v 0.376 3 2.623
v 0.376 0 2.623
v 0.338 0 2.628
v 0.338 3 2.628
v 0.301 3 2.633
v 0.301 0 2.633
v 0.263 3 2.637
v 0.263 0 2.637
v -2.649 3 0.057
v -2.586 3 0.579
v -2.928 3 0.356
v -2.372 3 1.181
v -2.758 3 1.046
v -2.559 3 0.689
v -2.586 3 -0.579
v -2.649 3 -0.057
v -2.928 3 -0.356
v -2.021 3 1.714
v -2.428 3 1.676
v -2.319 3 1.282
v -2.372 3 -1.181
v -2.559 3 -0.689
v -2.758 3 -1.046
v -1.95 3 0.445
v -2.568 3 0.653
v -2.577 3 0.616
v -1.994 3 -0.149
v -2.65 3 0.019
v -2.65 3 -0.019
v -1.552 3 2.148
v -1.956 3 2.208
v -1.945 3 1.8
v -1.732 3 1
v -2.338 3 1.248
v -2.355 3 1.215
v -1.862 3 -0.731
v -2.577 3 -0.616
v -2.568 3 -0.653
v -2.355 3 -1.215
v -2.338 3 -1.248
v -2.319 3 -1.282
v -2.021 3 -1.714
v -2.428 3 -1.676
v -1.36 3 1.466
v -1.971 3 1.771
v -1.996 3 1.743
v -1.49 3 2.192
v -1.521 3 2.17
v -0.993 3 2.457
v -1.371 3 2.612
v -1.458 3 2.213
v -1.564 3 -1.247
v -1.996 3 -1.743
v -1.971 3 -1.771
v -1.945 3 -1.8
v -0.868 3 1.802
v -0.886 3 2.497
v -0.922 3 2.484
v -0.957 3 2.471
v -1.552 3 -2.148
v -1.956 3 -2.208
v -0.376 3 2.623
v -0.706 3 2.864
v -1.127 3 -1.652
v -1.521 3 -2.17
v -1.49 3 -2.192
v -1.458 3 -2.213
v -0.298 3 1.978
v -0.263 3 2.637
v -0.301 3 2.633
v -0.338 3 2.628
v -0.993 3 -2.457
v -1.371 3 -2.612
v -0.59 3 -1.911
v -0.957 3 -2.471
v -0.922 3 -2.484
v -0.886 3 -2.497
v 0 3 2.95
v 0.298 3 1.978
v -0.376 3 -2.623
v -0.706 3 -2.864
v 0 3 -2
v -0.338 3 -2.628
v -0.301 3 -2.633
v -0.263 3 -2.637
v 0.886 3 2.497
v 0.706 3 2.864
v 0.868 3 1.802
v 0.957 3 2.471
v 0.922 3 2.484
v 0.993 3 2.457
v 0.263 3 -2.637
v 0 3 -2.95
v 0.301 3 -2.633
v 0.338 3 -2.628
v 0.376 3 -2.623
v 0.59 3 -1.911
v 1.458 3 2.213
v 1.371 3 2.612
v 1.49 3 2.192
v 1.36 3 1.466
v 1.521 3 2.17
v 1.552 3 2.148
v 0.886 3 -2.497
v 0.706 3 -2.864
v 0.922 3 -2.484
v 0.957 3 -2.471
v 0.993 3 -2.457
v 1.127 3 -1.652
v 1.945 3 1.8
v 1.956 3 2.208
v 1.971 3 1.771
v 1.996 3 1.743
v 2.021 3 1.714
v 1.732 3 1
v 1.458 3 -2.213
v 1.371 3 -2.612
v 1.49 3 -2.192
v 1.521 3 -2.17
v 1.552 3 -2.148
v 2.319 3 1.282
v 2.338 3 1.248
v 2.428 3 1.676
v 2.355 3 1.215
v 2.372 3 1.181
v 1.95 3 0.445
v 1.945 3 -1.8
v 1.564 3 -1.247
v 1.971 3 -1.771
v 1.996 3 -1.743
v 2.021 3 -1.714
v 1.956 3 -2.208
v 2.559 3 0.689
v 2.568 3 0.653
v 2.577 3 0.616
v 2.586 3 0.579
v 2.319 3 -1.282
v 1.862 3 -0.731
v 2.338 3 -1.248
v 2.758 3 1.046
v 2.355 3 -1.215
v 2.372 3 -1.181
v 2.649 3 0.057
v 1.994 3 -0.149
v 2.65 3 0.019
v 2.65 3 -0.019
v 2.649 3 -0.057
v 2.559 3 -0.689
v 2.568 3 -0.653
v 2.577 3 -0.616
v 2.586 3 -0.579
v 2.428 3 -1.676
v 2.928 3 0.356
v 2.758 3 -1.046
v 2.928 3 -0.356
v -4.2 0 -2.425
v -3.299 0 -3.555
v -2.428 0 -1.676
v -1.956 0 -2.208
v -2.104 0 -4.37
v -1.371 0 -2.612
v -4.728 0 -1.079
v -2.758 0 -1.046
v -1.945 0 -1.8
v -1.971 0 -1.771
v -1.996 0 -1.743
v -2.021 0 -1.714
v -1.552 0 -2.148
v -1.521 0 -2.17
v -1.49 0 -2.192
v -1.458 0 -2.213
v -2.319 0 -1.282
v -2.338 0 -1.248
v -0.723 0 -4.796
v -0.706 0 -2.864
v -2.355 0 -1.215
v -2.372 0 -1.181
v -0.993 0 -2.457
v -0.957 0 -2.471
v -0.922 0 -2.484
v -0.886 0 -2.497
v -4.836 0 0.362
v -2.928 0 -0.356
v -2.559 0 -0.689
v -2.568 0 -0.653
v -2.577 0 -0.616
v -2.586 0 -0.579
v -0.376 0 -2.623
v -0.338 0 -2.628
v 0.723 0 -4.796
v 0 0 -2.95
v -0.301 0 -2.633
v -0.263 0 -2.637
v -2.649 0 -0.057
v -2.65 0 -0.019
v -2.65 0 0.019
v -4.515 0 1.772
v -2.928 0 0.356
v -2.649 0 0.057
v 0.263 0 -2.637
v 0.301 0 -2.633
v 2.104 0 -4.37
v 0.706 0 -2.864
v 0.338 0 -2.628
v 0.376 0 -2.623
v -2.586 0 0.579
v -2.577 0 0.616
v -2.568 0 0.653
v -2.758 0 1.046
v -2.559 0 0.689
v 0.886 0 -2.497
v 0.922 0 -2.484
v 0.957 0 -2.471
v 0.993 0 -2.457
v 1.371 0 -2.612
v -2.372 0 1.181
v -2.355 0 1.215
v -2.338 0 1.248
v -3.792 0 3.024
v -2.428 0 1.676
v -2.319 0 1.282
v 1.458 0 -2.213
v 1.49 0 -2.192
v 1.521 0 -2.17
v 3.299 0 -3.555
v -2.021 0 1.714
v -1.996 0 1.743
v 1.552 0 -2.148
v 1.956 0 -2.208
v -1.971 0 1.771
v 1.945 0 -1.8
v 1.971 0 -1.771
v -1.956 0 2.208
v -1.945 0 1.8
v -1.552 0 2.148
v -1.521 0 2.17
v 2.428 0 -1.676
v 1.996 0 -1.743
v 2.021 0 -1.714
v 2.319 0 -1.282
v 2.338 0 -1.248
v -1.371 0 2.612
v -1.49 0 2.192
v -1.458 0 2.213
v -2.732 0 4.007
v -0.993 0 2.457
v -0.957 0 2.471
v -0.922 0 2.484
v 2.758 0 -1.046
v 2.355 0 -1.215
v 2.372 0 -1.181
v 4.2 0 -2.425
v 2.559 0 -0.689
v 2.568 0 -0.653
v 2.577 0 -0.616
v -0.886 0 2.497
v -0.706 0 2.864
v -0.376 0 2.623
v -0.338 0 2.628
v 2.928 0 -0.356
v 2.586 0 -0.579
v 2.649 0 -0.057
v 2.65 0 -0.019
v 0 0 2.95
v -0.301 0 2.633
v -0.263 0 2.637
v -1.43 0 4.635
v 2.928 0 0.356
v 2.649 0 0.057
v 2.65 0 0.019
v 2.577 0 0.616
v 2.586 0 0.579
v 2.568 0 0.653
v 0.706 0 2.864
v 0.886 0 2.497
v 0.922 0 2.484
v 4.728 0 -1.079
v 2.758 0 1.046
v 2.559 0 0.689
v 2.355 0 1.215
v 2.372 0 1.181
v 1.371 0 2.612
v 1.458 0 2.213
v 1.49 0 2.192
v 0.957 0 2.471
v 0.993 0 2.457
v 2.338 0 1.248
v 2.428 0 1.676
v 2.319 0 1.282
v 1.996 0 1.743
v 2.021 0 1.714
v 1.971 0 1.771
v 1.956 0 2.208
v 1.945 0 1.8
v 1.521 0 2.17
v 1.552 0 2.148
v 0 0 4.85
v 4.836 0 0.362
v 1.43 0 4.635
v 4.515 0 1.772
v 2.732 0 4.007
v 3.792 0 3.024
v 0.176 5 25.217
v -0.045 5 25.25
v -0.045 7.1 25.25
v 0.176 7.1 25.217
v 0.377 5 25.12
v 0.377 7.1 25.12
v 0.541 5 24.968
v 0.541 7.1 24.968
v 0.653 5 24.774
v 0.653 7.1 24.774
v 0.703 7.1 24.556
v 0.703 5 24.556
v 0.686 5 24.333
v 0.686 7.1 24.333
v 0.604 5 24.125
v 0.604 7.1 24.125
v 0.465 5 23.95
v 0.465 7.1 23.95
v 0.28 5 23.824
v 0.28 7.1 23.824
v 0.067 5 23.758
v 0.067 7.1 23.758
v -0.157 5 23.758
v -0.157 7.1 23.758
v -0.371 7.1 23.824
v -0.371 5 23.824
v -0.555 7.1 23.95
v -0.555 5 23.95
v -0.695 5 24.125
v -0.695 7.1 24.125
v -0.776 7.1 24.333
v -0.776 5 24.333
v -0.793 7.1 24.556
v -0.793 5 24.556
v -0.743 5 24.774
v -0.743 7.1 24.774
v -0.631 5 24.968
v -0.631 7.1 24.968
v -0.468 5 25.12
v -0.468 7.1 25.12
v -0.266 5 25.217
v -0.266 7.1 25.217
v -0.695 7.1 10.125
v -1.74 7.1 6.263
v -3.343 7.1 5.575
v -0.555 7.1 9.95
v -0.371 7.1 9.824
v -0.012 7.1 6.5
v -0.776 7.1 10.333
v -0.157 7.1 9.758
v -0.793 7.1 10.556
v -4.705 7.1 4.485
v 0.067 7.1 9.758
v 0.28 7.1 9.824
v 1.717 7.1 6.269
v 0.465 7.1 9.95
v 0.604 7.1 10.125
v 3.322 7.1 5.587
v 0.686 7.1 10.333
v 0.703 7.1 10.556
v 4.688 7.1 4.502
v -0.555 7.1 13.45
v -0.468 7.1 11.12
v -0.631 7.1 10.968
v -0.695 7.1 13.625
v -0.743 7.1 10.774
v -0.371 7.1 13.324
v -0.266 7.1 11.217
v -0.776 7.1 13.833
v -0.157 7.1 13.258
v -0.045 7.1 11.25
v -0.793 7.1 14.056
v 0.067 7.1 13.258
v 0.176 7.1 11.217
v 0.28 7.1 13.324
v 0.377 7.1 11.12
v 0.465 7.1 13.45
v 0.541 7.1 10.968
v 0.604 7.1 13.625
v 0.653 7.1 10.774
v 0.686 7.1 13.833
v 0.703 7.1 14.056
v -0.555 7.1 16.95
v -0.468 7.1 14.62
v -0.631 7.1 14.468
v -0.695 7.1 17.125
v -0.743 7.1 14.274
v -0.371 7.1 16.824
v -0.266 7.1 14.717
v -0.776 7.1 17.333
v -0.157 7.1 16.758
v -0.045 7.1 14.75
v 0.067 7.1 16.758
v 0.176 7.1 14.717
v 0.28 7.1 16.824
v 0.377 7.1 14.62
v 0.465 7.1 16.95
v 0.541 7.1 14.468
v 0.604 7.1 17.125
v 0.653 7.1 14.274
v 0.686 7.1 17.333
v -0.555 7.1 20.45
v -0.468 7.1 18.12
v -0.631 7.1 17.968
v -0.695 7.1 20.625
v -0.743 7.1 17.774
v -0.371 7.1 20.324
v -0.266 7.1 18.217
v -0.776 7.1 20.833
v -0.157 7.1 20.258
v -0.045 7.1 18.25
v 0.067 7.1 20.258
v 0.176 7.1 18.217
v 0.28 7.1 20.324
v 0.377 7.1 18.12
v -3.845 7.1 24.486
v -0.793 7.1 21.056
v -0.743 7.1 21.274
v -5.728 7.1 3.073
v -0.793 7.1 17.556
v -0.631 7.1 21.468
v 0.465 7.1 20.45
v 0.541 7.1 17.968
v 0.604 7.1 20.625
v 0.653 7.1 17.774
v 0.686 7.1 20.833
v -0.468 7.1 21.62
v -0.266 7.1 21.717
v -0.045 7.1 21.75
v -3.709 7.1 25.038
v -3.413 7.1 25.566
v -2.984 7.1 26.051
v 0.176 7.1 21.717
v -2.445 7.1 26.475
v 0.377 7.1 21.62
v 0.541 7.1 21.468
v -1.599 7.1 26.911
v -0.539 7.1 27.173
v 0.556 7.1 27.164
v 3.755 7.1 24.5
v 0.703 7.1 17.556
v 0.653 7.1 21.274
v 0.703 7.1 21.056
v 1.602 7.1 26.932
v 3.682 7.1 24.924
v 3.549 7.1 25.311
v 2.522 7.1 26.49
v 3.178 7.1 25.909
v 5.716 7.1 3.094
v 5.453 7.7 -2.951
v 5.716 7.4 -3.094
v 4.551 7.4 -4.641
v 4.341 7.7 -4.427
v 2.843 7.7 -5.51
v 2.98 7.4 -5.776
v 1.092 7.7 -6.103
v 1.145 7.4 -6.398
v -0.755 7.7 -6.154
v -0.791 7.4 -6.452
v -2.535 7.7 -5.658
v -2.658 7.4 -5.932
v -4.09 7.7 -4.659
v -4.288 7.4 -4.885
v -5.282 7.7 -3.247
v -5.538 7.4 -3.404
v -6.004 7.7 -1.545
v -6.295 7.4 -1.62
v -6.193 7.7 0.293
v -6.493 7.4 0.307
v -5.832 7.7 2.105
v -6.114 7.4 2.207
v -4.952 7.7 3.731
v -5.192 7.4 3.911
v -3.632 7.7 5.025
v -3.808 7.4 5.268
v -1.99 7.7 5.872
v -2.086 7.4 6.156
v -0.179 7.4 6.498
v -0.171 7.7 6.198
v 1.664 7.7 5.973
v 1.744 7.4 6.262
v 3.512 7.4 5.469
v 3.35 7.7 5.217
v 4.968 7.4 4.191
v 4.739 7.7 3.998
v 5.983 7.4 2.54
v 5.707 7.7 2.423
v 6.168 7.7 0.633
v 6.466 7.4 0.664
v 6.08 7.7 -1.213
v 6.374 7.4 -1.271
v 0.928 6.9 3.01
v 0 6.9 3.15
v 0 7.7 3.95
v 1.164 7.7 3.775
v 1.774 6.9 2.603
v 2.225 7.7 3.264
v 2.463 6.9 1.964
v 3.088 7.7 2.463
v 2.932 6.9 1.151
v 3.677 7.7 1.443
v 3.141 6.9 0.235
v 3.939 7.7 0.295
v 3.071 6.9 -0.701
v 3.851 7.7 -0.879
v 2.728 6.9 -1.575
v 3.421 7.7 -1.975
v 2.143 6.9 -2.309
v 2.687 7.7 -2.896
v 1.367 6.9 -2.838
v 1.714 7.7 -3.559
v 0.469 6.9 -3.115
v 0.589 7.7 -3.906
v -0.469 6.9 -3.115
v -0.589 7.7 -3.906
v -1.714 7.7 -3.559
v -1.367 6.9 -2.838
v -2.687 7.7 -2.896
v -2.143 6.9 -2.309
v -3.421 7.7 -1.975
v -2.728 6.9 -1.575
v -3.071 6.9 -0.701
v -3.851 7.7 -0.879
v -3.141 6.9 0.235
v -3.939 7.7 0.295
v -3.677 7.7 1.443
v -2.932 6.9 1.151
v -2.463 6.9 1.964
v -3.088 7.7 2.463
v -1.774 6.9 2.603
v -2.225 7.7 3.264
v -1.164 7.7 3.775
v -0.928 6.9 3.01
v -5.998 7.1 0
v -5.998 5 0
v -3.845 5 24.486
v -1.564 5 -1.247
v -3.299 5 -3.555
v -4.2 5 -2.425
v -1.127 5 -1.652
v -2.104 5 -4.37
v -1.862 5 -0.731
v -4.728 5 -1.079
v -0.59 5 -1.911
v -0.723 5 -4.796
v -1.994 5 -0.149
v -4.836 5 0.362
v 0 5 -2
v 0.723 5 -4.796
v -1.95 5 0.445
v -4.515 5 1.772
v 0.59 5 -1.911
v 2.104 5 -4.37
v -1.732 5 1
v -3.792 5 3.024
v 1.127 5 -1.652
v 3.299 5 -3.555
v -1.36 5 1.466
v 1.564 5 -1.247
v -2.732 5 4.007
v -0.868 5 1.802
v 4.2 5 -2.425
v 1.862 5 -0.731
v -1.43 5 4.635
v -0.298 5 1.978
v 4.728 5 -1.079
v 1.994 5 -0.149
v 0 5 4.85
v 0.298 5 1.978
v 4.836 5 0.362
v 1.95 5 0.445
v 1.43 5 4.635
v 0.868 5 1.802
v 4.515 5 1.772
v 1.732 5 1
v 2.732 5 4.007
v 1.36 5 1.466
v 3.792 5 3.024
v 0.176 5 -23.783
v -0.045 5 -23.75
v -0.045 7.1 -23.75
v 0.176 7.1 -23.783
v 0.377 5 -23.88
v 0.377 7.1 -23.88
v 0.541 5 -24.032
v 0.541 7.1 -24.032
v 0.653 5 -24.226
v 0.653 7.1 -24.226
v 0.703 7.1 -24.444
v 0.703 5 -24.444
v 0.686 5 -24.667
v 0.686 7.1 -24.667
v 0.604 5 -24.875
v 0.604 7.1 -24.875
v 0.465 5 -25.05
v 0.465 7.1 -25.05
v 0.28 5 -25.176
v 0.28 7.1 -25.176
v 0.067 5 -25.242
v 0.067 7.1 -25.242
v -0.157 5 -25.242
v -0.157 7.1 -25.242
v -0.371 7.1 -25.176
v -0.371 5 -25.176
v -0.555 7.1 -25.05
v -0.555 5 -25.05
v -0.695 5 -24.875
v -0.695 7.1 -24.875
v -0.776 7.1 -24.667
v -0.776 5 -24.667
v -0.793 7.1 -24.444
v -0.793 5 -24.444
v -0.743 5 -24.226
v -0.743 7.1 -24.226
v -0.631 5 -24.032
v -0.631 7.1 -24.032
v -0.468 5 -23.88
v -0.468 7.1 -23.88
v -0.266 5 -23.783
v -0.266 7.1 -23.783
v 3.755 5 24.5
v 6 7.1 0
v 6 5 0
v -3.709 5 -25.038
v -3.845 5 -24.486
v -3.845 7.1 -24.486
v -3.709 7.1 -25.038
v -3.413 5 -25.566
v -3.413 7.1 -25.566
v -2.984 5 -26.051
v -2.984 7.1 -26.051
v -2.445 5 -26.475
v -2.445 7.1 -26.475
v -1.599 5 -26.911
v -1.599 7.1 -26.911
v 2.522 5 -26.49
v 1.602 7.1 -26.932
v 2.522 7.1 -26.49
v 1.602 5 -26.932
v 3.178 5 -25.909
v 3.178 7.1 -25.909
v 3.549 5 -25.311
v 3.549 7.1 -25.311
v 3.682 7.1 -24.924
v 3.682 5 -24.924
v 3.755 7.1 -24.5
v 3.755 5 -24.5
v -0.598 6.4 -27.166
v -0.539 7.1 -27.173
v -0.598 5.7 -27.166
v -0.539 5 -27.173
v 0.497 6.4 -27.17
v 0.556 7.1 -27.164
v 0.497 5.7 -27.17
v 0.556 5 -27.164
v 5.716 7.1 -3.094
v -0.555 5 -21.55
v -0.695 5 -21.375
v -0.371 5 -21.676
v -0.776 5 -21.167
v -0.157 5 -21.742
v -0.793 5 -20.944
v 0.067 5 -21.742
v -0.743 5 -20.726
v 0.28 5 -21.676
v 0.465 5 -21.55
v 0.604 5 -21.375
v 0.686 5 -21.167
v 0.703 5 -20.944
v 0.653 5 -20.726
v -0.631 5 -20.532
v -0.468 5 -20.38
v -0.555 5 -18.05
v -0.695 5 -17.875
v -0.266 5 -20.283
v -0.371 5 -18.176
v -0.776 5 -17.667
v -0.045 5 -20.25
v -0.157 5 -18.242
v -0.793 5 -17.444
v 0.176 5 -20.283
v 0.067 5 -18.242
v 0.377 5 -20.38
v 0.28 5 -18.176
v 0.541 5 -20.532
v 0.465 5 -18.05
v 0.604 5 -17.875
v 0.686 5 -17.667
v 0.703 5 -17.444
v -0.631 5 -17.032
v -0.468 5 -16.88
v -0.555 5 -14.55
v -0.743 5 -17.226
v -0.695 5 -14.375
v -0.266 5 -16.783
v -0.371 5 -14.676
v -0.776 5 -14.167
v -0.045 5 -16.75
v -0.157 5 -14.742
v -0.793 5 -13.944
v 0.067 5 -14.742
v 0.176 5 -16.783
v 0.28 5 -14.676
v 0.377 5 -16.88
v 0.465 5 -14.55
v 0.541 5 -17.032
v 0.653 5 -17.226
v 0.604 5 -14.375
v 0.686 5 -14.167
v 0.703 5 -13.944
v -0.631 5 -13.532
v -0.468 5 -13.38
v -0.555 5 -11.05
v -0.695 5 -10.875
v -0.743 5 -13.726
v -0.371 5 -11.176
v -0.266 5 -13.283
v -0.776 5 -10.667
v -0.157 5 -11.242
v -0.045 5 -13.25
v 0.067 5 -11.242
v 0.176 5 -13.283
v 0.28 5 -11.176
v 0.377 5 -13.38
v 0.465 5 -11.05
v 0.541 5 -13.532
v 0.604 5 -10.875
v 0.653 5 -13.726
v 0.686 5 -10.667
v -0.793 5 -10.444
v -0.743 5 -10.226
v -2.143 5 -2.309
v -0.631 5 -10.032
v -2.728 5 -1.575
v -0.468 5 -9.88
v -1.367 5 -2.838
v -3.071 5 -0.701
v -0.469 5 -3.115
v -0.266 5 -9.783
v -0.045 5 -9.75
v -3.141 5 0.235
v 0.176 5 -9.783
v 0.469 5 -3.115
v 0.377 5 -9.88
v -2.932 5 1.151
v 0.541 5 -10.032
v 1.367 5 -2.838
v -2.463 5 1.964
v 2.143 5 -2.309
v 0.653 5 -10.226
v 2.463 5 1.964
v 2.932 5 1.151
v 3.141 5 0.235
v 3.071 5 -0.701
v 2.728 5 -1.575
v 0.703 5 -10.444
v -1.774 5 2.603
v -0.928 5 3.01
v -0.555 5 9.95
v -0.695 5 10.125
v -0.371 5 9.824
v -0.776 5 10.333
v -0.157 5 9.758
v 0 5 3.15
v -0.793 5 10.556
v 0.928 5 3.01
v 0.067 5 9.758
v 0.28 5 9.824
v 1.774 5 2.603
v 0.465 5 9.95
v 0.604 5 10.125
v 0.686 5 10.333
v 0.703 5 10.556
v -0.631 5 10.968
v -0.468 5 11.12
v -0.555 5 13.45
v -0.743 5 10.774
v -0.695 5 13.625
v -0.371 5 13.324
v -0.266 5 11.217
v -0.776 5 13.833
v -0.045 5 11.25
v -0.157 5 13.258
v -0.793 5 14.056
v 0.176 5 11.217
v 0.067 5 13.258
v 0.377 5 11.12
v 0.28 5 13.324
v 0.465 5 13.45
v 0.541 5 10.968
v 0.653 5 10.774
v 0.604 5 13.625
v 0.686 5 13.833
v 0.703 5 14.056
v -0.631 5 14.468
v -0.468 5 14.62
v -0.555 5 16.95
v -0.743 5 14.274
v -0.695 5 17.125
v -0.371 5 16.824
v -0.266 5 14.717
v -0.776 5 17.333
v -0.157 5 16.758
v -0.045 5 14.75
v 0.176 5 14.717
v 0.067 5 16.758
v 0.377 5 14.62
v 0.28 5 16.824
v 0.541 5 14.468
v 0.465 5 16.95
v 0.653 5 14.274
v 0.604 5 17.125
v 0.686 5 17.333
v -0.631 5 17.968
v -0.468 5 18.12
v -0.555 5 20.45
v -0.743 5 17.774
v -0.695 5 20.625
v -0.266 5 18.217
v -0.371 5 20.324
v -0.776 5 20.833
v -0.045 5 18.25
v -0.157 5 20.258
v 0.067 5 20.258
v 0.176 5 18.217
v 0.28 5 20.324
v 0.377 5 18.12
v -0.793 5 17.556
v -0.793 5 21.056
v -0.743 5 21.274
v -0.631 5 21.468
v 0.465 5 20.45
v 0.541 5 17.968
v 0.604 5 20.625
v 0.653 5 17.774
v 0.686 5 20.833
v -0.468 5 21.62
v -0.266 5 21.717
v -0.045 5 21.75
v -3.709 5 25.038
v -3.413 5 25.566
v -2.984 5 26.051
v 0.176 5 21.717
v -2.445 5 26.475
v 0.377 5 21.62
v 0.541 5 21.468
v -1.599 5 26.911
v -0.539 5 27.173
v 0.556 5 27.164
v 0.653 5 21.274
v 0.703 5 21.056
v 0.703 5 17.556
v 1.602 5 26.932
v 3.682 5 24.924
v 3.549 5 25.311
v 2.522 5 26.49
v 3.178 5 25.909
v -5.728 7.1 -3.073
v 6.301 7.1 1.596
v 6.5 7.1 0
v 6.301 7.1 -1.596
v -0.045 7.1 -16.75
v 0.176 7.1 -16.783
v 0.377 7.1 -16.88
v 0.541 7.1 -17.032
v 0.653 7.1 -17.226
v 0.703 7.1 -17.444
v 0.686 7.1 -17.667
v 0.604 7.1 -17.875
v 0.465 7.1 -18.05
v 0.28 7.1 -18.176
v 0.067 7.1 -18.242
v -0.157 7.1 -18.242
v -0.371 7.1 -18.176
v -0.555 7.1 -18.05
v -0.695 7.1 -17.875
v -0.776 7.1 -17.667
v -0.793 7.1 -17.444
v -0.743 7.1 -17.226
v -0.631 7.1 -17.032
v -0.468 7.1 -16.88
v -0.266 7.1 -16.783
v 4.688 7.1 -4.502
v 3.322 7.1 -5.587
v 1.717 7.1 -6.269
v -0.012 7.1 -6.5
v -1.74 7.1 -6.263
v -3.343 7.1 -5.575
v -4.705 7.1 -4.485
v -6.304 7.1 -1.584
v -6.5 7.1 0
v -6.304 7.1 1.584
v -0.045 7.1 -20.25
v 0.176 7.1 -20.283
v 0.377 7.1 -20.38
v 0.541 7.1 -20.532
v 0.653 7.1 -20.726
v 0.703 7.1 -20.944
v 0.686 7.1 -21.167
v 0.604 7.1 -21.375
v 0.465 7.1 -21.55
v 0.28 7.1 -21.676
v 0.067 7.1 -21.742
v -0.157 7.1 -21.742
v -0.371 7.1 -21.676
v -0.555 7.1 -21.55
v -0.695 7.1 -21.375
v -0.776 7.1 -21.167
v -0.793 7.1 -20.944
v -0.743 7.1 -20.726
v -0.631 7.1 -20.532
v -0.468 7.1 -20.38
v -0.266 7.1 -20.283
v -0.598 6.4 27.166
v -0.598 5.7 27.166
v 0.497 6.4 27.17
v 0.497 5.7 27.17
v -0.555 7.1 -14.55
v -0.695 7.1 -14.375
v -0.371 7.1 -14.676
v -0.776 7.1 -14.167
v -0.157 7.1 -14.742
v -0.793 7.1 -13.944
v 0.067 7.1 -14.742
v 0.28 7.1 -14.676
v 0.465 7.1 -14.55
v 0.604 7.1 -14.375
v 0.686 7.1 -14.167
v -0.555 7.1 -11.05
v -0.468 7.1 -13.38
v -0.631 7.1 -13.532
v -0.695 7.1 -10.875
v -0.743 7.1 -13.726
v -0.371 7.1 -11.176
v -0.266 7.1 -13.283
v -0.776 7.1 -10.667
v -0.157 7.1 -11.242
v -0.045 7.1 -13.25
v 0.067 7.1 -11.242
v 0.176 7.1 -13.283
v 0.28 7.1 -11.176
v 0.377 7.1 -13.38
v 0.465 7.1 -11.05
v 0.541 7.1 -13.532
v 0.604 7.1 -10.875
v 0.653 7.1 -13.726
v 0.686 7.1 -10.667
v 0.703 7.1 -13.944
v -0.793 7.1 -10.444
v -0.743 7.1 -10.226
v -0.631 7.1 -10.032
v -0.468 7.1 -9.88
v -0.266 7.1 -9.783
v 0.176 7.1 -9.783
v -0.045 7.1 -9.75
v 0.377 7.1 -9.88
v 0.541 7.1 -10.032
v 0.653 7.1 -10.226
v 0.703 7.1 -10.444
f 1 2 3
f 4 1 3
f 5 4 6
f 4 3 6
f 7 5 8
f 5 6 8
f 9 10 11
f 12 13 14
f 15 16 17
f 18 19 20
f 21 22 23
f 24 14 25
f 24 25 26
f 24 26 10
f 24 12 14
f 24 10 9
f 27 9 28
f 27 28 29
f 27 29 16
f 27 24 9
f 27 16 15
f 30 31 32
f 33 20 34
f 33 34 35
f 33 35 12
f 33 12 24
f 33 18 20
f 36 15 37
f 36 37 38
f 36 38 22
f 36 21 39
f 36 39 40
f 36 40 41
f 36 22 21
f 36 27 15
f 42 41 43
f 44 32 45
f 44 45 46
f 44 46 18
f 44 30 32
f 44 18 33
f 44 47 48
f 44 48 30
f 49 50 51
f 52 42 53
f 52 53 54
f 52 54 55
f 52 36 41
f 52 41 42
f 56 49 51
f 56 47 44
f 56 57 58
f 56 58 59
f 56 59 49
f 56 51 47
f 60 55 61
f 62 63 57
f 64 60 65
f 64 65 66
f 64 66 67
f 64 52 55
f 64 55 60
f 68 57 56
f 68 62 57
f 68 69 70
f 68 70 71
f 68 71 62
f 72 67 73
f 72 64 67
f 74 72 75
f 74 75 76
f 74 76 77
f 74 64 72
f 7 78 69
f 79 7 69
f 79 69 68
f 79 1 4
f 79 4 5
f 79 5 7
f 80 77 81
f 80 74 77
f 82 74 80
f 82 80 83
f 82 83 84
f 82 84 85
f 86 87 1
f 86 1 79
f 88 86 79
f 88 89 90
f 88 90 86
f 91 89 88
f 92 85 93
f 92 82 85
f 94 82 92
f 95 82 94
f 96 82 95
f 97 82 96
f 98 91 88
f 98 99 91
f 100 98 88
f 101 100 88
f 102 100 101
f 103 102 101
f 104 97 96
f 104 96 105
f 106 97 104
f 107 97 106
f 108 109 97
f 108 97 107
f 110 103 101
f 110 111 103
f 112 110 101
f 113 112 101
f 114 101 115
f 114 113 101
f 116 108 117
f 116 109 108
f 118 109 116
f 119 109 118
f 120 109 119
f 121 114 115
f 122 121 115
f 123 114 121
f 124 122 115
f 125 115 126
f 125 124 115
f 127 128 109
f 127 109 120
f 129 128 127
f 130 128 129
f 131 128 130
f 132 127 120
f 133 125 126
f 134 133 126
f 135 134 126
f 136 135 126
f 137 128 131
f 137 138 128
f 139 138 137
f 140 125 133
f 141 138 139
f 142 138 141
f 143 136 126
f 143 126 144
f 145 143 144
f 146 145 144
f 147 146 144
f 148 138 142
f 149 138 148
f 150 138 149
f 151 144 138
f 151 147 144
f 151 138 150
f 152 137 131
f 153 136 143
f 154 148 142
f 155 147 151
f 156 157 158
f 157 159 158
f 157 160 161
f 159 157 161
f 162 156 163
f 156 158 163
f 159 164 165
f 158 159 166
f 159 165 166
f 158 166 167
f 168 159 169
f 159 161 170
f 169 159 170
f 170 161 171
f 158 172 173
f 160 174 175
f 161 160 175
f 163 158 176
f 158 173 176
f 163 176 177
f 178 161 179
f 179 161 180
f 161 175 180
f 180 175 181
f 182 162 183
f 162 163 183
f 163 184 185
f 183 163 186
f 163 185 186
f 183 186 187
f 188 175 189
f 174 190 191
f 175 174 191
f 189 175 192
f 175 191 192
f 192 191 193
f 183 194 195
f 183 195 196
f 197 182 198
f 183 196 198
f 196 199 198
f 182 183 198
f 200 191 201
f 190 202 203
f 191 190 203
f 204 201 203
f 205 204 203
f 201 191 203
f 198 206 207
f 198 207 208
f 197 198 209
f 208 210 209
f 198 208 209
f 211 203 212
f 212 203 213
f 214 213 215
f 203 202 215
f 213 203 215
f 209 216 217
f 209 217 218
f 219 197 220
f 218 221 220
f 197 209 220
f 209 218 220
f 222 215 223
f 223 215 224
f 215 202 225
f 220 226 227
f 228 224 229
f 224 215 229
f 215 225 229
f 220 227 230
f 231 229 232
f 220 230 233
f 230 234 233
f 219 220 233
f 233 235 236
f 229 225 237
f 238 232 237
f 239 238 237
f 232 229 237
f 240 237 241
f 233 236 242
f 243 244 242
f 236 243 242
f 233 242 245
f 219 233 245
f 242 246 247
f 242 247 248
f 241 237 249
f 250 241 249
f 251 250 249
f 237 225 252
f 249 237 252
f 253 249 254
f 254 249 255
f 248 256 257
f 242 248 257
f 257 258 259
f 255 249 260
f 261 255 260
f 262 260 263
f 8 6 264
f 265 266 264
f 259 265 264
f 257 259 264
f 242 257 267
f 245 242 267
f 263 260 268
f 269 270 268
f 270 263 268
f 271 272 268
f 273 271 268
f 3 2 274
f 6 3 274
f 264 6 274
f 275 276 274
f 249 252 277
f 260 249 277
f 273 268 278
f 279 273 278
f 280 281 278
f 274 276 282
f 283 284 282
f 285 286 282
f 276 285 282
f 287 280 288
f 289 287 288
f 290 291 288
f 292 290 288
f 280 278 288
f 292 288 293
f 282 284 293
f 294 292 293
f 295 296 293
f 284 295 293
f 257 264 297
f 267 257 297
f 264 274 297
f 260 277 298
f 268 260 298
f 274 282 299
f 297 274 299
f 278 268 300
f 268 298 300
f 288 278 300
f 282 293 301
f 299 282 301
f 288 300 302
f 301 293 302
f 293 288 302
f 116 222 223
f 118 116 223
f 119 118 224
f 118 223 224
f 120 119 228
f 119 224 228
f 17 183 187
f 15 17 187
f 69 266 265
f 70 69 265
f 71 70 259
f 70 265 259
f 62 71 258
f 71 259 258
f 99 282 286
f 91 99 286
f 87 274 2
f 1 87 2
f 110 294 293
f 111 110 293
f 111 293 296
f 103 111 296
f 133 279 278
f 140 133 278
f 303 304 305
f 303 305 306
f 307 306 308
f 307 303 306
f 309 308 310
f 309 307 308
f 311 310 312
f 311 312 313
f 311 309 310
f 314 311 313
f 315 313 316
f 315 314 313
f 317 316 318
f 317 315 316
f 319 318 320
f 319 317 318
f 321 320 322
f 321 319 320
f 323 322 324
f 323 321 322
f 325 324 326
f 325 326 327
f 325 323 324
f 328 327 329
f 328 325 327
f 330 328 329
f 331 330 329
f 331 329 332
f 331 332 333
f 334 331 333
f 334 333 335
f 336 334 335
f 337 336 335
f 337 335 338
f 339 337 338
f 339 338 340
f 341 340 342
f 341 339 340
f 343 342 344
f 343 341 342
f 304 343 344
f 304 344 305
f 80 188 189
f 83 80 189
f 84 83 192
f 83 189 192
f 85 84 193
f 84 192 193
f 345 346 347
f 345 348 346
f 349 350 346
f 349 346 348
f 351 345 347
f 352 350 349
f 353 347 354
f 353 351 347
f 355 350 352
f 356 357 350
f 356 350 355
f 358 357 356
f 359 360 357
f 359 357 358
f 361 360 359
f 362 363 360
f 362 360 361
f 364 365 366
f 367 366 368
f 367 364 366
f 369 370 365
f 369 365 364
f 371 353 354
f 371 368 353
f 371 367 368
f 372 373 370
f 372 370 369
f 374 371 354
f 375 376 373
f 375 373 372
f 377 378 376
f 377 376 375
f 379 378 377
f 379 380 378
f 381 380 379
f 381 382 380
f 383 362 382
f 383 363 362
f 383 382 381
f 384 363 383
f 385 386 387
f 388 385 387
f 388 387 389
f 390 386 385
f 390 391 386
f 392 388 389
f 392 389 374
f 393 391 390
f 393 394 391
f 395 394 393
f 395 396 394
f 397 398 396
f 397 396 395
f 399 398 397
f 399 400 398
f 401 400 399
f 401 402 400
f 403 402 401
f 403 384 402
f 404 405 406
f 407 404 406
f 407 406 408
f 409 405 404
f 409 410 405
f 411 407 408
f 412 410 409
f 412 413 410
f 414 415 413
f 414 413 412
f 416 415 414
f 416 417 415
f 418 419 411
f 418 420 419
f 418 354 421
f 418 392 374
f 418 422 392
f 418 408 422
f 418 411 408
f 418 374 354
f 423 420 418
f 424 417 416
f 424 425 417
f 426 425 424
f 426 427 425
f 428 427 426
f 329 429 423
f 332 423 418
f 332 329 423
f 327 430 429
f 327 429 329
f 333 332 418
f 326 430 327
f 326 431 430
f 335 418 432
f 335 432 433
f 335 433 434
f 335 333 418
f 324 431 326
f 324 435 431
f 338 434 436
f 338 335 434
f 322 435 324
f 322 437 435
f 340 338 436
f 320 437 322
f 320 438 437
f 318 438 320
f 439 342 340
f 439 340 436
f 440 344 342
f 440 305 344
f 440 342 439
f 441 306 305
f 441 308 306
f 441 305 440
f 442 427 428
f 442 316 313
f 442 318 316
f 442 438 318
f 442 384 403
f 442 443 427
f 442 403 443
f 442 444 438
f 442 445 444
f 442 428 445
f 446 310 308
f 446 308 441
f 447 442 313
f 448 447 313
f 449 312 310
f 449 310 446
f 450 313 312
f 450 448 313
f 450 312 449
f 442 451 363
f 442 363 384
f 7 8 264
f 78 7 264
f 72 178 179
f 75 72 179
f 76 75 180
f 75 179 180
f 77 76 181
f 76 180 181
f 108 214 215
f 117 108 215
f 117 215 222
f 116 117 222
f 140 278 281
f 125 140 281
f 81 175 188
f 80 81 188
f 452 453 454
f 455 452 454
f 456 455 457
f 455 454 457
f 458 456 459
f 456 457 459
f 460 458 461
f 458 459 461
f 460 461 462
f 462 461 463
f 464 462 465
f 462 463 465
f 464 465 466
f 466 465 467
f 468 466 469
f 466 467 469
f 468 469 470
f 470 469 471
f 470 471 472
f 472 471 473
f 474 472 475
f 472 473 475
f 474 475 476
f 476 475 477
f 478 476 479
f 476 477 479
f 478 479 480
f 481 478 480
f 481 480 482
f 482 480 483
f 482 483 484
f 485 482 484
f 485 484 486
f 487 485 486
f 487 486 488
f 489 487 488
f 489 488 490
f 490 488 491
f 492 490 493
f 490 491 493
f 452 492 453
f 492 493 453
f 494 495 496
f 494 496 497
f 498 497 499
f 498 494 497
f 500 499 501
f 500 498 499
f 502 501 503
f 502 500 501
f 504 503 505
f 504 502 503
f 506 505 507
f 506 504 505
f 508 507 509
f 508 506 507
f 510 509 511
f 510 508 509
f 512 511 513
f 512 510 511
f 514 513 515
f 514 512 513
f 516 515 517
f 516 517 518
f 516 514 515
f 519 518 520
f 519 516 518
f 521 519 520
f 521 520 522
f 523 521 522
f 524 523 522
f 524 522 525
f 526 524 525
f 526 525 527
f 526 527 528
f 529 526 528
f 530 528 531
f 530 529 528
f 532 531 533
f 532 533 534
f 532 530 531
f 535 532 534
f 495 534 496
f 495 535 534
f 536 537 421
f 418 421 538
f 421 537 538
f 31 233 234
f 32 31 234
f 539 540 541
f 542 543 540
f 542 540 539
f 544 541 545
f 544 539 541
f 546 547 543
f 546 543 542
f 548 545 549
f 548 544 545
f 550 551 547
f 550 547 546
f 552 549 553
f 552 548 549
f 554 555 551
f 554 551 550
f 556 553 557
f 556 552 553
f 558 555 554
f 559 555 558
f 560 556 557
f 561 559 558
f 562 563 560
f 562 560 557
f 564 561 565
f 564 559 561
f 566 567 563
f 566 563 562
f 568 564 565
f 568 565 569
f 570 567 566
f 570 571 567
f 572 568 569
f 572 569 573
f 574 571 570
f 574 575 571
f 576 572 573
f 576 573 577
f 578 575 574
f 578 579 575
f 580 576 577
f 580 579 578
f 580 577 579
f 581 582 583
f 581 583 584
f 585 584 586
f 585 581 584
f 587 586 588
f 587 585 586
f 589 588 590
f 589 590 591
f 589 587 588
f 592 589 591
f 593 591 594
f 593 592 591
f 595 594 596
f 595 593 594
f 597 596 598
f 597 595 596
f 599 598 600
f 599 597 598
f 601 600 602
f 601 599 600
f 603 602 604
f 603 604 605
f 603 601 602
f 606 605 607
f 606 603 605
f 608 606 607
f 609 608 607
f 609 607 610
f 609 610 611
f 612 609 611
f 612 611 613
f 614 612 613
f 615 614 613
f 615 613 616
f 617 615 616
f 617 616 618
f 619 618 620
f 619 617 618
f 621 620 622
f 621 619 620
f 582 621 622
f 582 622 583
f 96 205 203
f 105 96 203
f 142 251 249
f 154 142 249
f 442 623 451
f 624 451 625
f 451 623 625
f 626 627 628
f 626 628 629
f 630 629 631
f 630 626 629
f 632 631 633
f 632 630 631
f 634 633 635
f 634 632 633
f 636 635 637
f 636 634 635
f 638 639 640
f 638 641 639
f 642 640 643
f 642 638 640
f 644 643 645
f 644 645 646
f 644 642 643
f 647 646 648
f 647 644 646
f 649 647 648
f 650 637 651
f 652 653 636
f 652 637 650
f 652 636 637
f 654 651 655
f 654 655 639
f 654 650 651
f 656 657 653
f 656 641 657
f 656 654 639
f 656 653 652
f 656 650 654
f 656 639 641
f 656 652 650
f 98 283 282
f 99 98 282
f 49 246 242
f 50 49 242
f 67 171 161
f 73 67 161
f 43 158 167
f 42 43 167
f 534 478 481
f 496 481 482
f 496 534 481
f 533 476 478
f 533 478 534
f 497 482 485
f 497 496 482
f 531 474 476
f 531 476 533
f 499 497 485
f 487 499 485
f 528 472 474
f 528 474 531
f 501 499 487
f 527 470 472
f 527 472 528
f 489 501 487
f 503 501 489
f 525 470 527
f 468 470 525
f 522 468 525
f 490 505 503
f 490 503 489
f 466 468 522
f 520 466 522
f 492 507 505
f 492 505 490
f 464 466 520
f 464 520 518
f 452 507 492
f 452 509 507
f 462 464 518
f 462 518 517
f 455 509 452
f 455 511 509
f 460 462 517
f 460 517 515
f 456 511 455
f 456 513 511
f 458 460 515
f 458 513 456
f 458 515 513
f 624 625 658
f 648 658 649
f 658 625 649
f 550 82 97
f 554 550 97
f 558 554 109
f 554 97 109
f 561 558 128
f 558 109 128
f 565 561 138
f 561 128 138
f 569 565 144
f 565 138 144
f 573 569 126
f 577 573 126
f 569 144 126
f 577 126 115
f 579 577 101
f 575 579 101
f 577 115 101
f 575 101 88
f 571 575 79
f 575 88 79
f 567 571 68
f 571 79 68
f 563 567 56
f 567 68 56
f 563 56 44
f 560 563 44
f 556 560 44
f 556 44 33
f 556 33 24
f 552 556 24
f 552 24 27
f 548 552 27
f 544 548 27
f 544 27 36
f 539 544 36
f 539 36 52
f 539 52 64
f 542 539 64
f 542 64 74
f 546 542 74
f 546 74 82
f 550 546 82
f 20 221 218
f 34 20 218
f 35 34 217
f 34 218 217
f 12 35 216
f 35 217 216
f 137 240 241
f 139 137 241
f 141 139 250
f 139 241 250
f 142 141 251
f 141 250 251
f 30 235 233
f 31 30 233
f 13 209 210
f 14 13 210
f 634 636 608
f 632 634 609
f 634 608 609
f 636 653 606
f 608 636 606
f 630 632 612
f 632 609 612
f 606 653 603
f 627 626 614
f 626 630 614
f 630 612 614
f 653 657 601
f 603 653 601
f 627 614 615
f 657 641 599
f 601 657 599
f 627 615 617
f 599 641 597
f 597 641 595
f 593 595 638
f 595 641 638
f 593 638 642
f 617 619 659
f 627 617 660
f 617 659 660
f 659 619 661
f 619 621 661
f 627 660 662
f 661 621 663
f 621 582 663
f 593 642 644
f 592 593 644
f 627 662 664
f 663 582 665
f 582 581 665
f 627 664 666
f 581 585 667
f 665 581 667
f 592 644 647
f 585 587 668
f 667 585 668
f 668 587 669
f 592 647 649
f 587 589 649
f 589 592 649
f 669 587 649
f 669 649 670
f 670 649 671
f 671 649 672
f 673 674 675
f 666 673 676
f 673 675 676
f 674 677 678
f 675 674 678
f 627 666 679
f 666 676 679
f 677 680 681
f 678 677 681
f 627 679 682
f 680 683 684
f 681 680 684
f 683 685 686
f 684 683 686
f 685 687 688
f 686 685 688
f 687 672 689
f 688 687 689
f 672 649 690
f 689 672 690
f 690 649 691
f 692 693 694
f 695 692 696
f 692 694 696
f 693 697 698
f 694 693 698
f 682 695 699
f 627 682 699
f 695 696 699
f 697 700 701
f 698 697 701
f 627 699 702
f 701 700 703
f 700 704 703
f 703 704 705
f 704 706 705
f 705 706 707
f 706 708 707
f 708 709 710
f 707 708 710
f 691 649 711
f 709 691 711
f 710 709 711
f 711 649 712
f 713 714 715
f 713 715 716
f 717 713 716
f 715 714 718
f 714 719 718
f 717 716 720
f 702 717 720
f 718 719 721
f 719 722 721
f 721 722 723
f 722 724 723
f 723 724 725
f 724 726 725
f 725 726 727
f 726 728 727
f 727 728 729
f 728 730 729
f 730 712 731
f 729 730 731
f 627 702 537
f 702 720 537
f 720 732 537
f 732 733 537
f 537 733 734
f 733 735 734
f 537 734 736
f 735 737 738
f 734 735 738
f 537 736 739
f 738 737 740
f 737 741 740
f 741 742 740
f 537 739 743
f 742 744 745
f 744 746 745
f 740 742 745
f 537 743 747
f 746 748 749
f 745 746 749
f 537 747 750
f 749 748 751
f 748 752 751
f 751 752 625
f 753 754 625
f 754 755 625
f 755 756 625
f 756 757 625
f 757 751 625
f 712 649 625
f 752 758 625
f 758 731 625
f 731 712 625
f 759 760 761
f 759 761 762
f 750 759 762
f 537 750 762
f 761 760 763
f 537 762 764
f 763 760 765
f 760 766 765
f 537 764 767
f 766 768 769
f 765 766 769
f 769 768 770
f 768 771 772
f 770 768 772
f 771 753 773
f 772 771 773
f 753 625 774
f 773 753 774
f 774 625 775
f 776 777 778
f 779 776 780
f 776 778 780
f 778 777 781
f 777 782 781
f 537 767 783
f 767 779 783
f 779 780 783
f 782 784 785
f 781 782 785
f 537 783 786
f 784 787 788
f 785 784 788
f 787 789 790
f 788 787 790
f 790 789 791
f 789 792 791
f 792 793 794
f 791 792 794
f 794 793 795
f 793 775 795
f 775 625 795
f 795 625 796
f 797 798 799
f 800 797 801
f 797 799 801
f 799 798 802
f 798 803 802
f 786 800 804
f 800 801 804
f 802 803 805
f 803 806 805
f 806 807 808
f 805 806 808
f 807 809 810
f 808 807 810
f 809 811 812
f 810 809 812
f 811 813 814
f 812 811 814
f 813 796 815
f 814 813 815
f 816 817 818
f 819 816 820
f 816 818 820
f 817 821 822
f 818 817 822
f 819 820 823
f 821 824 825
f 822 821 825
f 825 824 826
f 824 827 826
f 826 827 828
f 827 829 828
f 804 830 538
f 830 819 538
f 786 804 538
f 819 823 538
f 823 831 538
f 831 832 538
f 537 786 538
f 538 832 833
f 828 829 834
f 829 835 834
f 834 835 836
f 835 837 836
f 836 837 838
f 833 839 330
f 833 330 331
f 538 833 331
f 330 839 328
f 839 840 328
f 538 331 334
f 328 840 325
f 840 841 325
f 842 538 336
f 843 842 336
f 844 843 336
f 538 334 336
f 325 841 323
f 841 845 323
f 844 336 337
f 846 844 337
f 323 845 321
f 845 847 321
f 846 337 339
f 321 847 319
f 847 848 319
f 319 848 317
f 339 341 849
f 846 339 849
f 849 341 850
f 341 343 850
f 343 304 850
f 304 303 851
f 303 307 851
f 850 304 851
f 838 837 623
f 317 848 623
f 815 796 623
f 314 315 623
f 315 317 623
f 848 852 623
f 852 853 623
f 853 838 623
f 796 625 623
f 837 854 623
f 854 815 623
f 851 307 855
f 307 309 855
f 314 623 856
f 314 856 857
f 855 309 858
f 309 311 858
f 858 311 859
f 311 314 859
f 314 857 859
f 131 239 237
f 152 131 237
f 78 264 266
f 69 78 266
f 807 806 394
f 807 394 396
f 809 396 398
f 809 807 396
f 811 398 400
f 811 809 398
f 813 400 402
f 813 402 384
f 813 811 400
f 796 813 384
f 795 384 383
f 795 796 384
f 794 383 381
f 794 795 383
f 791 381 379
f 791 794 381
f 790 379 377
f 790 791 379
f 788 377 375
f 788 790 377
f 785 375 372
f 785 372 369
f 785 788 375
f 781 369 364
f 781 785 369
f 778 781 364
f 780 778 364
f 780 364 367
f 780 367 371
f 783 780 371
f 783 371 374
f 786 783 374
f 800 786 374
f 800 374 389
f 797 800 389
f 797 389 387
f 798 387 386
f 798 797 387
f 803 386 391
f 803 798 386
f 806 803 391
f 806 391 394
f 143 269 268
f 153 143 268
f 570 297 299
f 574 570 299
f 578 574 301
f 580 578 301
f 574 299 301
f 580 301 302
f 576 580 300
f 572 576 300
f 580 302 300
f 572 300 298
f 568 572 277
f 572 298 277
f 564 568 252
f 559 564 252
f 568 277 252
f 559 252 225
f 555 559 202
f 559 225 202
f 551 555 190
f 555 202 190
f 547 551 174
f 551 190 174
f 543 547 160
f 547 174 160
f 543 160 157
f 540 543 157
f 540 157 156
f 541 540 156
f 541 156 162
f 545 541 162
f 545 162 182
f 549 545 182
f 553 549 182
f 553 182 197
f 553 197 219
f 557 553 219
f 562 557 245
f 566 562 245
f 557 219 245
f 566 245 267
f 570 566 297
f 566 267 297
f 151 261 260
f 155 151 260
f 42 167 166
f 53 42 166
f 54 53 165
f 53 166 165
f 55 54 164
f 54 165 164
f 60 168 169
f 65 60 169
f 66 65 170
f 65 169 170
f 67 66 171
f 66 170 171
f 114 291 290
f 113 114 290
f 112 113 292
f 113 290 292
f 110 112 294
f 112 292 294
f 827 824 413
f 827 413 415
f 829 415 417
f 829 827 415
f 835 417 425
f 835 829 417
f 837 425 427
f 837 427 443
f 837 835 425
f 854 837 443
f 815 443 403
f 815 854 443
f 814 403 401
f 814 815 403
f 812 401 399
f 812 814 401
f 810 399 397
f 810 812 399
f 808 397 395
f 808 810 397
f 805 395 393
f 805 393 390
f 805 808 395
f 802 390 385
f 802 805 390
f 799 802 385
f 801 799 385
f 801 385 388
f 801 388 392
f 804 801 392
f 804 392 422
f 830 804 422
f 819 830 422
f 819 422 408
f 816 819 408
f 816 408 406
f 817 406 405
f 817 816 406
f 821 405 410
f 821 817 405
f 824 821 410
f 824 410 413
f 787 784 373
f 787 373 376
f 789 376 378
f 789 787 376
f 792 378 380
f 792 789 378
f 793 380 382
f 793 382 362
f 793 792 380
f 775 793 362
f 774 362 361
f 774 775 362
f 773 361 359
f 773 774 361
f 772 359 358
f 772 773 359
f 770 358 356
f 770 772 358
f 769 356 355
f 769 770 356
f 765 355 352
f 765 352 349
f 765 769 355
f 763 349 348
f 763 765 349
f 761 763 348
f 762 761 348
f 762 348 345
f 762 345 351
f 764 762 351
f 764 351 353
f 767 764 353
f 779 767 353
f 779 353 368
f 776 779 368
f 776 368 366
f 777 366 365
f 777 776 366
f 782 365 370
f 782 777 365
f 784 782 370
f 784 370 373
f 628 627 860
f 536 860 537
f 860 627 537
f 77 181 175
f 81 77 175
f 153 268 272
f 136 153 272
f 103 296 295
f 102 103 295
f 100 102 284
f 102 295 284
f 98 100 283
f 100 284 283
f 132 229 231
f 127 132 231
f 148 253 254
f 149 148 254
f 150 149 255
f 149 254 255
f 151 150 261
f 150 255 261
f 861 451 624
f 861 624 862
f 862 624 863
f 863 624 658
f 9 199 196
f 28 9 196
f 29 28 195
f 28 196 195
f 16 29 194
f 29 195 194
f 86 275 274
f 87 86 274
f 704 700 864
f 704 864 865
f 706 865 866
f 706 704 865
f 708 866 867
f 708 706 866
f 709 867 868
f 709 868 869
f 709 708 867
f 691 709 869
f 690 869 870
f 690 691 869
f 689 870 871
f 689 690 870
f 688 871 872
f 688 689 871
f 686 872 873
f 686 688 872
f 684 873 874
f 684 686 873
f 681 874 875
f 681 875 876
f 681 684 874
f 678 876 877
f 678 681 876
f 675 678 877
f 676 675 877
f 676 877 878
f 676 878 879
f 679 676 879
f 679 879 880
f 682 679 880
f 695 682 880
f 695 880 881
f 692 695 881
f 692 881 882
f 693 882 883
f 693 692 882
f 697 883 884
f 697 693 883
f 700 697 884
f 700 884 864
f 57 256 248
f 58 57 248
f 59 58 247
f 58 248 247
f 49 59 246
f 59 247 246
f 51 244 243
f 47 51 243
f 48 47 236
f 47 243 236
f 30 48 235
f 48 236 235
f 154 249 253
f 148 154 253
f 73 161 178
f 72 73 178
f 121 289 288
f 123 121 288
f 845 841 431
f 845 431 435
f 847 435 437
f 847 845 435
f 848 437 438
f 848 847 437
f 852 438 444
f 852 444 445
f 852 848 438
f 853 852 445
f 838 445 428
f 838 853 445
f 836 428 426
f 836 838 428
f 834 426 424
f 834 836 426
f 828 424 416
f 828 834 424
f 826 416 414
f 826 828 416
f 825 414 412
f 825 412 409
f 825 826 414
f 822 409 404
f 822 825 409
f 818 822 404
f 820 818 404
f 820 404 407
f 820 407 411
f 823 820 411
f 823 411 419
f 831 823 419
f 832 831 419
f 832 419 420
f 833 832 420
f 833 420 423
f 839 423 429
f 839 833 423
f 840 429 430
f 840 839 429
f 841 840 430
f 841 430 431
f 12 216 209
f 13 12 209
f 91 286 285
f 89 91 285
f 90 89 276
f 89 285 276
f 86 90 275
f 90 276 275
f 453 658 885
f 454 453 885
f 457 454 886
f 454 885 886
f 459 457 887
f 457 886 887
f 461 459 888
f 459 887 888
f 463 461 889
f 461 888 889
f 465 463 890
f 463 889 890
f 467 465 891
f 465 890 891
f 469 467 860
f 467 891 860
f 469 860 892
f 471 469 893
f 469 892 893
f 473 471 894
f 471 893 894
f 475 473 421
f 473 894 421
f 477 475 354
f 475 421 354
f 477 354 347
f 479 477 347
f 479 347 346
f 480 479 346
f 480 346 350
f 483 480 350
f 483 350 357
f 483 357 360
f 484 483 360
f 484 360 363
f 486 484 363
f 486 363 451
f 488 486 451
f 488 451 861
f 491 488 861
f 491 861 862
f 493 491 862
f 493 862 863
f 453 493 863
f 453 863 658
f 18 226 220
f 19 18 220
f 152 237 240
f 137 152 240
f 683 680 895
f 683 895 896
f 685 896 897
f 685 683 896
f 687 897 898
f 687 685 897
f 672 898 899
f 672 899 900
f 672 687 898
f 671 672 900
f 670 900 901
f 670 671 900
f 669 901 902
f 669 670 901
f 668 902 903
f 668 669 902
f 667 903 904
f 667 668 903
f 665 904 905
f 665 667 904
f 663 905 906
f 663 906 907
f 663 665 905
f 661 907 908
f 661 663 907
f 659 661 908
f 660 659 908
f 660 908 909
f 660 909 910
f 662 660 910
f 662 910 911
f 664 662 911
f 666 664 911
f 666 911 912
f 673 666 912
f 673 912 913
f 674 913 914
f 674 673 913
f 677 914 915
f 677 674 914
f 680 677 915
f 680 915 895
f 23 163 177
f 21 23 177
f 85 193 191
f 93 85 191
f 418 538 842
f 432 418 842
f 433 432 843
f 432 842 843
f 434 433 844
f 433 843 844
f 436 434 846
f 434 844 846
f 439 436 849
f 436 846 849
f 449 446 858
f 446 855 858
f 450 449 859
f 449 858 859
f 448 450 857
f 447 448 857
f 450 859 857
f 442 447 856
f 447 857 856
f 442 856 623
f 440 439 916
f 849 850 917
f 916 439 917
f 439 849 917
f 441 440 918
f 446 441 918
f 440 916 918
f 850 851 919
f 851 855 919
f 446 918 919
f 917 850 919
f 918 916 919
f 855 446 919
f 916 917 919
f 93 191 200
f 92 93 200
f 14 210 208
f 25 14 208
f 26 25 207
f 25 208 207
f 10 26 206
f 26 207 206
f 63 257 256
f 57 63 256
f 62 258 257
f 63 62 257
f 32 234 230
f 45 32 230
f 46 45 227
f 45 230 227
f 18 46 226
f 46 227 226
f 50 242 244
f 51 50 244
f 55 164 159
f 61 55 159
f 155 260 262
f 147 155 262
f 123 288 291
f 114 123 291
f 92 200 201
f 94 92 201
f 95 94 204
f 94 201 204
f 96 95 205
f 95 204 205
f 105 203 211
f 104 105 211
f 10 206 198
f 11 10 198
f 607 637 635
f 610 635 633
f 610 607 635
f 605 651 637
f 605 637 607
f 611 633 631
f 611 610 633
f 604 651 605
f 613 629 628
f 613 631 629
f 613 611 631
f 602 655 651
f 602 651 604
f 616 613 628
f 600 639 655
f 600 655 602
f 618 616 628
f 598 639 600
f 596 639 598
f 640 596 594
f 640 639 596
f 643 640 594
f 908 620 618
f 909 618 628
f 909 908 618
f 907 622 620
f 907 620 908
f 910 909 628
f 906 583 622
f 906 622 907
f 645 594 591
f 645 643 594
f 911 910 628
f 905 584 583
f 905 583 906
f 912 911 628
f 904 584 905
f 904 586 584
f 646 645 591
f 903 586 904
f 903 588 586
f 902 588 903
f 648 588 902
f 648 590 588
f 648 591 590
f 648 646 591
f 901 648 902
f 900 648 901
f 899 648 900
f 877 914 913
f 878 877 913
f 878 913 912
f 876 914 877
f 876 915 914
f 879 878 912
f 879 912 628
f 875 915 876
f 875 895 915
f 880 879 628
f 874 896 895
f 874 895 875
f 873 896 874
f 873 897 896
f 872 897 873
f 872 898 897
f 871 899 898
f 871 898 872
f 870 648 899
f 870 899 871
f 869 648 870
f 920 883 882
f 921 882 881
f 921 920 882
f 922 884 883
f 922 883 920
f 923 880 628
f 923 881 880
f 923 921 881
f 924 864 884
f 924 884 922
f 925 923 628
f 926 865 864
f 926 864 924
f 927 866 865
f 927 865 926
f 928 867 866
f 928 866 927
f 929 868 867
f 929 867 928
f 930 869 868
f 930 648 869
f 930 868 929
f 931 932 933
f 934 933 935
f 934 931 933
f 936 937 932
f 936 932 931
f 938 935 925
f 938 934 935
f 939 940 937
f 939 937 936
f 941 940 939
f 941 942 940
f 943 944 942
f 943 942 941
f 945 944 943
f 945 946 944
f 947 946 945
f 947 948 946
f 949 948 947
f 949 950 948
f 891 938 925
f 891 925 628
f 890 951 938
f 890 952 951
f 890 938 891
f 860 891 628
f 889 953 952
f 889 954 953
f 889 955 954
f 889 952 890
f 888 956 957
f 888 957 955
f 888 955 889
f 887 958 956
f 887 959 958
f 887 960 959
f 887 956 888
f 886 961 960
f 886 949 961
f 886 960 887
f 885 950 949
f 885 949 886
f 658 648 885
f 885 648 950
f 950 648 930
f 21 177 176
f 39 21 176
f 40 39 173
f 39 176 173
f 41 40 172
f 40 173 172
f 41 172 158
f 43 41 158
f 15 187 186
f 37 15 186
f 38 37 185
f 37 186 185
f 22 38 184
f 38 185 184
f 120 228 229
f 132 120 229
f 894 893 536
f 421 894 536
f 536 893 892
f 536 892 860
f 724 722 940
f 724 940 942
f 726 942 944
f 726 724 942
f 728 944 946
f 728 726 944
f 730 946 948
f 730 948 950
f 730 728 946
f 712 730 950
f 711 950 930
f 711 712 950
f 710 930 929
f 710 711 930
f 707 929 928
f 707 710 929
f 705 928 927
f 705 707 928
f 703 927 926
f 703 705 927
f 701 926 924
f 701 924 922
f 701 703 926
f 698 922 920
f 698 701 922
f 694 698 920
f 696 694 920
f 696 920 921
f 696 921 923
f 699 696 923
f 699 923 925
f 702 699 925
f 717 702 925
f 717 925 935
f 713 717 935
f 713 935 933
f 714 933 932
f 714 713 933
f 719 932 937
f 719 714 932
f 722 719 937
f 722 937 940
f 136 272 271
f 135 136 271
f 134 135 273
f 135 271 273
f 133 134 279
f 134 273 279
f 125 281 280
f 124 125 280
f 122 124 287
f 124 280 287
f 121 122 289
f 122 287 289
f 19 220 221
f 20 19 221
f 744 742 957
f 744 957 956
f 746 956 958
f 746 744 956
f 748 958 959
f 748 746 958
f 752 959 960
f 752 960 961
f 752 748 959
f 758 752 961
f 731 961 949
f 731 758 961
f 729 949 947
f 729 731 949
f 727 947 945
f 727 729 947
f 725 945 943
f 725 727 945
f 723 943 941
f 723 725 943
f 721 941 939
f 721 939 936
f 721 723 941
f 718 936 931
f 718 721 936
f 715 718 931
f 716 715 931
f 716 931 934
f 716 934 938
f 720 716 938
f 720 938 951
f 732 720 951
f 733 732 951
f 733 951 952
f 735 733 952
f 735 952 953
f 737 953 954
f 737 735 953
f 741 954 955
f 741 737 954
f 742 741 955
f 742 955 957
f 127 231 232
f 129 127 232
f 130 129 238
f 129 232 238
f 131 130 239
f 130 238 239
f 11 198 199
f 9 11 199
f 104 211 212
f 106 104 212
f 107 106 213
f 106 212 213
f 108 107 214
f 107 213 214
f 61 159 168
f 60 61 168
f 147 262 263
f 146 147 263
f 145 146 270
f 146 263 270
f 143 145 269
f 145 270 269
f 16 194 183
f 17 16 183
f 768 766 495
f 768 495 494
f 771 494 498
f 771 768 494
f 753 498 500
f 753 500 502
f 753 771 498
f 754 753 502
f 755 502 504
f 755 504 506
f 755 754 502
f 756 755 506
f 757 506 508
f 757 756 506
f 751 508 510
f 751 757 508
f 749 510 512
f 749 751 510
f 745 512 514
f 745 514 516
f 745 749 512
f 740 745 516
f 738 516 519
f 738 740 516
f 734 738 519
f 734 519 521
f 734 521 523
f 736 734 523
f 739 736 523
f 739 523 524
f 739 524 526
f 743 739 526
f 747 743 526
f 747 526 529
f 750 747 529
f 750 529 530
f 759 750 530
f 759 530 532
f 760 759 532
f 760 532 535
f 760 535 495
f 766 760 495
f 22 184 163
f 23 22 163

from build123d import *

# Parameters (mm, degrees)
SKETCH1_R           = 4.85
BASE_DEPTH          = 5
SKETCH2_R           = 0.75
SKETCH2_R_2         = 4.85
SKETCH2_R_3         = 3.15
BOSS_EXTRUDE2_DEPTH = 2.1
SKETCH3_R           = 6.5
SKETCH3_R_2         = 3.15
BOSS_EXTRUDE3_DEPTH = 0.6
CHAMFER1_SIZE       = 0.8
CHAMFER2_SIZE       = 0.3
CUT_EXTRUDE1_DEPTH  = 3
CIRPATTERN1_COUNT   = 26
SKETCH5_R           = 2.65
CUT_EXTRUDE2_DEPTH  = 3
SKETCH6_R           = 2
CUT_EXTRUDE3_DEPTH  = 3


with BuildPart() as part:
    # Sketch1 → Base (new body)
    with BuildSketch(Plane(origin=(0, 0, 0), x_dir=(1, 0, 0), z_dir=(0, 1, 0))):
        with Locations(Location((0, 0, 0), (0, 0, 270))):
            Circle(SKETCH1_R)
    extrude(amount=BASE_DEPTH)

    # Sketch4 → Cut-Extrude1 (cut)
    with BuildSketch(Plane.XZ):
        with BuildLine():
            Line((-0.262681209, -2.636948726), (0, -2.95))
            Line((0, -2.95), (0.262681209, -2.636948726))
            ThreePointArc((0.262681209, -2.636948726), (0, -2.65), (-0.262681209, -2.636948726))
        make_face()
    cut_extrude1 = extrude(amount=-CUT_EXTRUDE1_DEPTH, mode=Mode.SUBTRACT)

    # CirPattern1: Cut-Extrude1 ×26 about axis
    cirpattern1_axis = Axis((0, 0, 0), (0, 1, 0))
    for i in range(1, CIRPATTERN1_COUNT):
        add(cut_extrude1.rotate(cirpattern1_axis, i * 360 / CIRPATTERN1_COUNT), mode=Mode.SUBTRACT)

    # Sketch5 → Cut-Extrude2 (cut)
    with BuildSketch(Plane.XZ):
        Circle(SKETCH5_R)
    extrude(amount=-CUT_EXTRUDE2_DEPTH, mode=Mode.SUBTRACT)

    # Sketch6 → Cut-Extrude3 (cut)
    with BuildSketch(Plane.XZ.offset(-3)):
        with Locations(Location((0, 0, 0), (0, 0, 270))):
            Circle(SKETCH6_R)
    extrude(amount=-CUT_EXTRUDE3_DEPTH, mode=Mode.SUBTRACT)


with BuildPart() as body_2:
    # Sketch2 → Boss-Extrude2 (new body)
    # profile 1 of 2: a face of its own
    with BuildSketch(Plane(origin=(0, 5, 0), x_dir=(1, 0, 0), z_dir=(0, 1, 0))):
        with BuildLine():
            Line((3.754897555, -24.5), (6, 0))
            Line((6, 0), (3.754897555, 24.5))
            add(Edge.make_bspline(
                [(-3.845102445, 24.48600504), (-3.734781319, 25.740734056), (-1.898564179, 27.229613074), (1.798625564, 27.191534839), (3.606306924, 26.121516409), (3.754897555, 24.5)],
                knots=[0, 0, 0, 0, 0.45, 0.55, 1, 1, 1, 1], degree=3))
            Line((-3.845102445, 24.48600504), (-5.998016427, 0))
            Line((-5.998016427, 0), (-3.845102445, -24.48600504))
            add(Edge.make_bspline(
                [(-3.845102445, -24.48600504), (-3.734781319, -25.740734056), (-1.898564179, -27.229613074), (1.798625564, -27.191534839), (3.606306924, -26.121516409), (3.754897555, -24.5)],
                knots=[0, 0, 0, 0, 0.45, 0.55, 1, 1, 1, 1], degree=3))
        make_face()
        with Locations(Location((-0.04511533, -24.5, 0), (0, 0, 270))):
            Circle(SKETCH2_R, mode=Mode.SUBTRACT)
        with Locations(Location((-0.04511533, -21, 0), (0, 0, 270))):
            Circle(SKETCH2_R, mode=Mode.SUBTRACT)
        with Locations(Location((-0.04511533, -17.5, 0), (0, 0, 270))):
            Circle(SKETCH2_R, mode=Mode.SUBTRACT)
        with Locations(Location((-0.04511533, -14, 0), (0, 0, 270))):
            Circle(SKETCH2_R, mode=Mode.SUBTRACT)
        with Locations(Location((-0.04511533, -10.5, 0), (0, 0, 270))):
            Circle(SKETCH2_R, mode=Mode.SUBTRACT)
        with Locations(Location((0, 0, 0), (0, 0, 270))):
            Circle(SKETCH2_R_2, mode=Mode.SUBTRACT)
        with Locations(Location((-0.04511533, 10.5, 0), (0, 0, 270))):
            Circle(SKETCH2_R, mode=Mode.SUBTRACT)
        with Locations(Location((-0.04511533, 14, 0), (0, 0, 270))):
            Circle(SKETCH2_R, mode=Mode.SUBTRACT)
        with Locations(Location((-0.04511533, 17.5, 0), (0, 0, 270))):
            Circle(SKETCH2_R, mode=Mode.SUBTRACT)
        with Locations(Location((-0.04511533, 21, 0), (0, 0, 270))):
            Circle(SKETCH2_R, mode=Mode.SUBTRACT)
        with Locations(Location((-0.04511533, 24.5, 0), (0, 0, 270))):
            Circle(SKETCH2_R, mode=Mode.SUBTRACT)
    # profile 2 of 2: a face of its own
    with BuildSketch(Plane(origin=(0, 5, 0), x_dir=(1, 0, 0), z_dir=(0, 1, 0))):
        with Locations(Location((0, 0, 0), (0, 0, 270))):
            Circle(SKETCH2_R_2)
        with Locations(Location((0, 0, 0), (0, 0, 270))):
            Circle(SKETCH2_R_3, mode=Mode.SUBTRACT)
    extrude(amount=BOSS_EXTRUDE2_DEPTH)

    # Sketch3 → Boss-Extrude3 (add)
    with BuildSketch(Plane(origin=(0, 7.1, 0), x_dir=(1, 0, 0), z_dir=(0, 1, 0))):
        with Locations(Location((0, 0, 0), (0, 0, 28.422667101))):
            Circle(SKETCH3_R)
        with Locations(Location((0, 0, 0), (0, 0, 270))):
            Circle(SKETCH3_R_2, mode=Mode.SUBTRACT)
    extrude(amount=BOSS_EXTRUDE3_DEPTH)

    # Chamfer1
    chamfer1_edges = [body_2.edges().sort_by_distance(p)[0] for p in [
        (0, 7.7, -3.15),
    ]]
    chamfer(chamfer1_edges, length=CHAMFER1_SIZE)

    # Chamfer2
    chamfer2_edges = [body_2.edges().sort_by_distance(p)[0] for p in [
        (-5.716492208, 7.7, 3.093819134),
    ]]
    chamfer(chamfer2_edges, length=CHAMFER2_SIZE)


solid = Compound([part.part, body_2.part])
